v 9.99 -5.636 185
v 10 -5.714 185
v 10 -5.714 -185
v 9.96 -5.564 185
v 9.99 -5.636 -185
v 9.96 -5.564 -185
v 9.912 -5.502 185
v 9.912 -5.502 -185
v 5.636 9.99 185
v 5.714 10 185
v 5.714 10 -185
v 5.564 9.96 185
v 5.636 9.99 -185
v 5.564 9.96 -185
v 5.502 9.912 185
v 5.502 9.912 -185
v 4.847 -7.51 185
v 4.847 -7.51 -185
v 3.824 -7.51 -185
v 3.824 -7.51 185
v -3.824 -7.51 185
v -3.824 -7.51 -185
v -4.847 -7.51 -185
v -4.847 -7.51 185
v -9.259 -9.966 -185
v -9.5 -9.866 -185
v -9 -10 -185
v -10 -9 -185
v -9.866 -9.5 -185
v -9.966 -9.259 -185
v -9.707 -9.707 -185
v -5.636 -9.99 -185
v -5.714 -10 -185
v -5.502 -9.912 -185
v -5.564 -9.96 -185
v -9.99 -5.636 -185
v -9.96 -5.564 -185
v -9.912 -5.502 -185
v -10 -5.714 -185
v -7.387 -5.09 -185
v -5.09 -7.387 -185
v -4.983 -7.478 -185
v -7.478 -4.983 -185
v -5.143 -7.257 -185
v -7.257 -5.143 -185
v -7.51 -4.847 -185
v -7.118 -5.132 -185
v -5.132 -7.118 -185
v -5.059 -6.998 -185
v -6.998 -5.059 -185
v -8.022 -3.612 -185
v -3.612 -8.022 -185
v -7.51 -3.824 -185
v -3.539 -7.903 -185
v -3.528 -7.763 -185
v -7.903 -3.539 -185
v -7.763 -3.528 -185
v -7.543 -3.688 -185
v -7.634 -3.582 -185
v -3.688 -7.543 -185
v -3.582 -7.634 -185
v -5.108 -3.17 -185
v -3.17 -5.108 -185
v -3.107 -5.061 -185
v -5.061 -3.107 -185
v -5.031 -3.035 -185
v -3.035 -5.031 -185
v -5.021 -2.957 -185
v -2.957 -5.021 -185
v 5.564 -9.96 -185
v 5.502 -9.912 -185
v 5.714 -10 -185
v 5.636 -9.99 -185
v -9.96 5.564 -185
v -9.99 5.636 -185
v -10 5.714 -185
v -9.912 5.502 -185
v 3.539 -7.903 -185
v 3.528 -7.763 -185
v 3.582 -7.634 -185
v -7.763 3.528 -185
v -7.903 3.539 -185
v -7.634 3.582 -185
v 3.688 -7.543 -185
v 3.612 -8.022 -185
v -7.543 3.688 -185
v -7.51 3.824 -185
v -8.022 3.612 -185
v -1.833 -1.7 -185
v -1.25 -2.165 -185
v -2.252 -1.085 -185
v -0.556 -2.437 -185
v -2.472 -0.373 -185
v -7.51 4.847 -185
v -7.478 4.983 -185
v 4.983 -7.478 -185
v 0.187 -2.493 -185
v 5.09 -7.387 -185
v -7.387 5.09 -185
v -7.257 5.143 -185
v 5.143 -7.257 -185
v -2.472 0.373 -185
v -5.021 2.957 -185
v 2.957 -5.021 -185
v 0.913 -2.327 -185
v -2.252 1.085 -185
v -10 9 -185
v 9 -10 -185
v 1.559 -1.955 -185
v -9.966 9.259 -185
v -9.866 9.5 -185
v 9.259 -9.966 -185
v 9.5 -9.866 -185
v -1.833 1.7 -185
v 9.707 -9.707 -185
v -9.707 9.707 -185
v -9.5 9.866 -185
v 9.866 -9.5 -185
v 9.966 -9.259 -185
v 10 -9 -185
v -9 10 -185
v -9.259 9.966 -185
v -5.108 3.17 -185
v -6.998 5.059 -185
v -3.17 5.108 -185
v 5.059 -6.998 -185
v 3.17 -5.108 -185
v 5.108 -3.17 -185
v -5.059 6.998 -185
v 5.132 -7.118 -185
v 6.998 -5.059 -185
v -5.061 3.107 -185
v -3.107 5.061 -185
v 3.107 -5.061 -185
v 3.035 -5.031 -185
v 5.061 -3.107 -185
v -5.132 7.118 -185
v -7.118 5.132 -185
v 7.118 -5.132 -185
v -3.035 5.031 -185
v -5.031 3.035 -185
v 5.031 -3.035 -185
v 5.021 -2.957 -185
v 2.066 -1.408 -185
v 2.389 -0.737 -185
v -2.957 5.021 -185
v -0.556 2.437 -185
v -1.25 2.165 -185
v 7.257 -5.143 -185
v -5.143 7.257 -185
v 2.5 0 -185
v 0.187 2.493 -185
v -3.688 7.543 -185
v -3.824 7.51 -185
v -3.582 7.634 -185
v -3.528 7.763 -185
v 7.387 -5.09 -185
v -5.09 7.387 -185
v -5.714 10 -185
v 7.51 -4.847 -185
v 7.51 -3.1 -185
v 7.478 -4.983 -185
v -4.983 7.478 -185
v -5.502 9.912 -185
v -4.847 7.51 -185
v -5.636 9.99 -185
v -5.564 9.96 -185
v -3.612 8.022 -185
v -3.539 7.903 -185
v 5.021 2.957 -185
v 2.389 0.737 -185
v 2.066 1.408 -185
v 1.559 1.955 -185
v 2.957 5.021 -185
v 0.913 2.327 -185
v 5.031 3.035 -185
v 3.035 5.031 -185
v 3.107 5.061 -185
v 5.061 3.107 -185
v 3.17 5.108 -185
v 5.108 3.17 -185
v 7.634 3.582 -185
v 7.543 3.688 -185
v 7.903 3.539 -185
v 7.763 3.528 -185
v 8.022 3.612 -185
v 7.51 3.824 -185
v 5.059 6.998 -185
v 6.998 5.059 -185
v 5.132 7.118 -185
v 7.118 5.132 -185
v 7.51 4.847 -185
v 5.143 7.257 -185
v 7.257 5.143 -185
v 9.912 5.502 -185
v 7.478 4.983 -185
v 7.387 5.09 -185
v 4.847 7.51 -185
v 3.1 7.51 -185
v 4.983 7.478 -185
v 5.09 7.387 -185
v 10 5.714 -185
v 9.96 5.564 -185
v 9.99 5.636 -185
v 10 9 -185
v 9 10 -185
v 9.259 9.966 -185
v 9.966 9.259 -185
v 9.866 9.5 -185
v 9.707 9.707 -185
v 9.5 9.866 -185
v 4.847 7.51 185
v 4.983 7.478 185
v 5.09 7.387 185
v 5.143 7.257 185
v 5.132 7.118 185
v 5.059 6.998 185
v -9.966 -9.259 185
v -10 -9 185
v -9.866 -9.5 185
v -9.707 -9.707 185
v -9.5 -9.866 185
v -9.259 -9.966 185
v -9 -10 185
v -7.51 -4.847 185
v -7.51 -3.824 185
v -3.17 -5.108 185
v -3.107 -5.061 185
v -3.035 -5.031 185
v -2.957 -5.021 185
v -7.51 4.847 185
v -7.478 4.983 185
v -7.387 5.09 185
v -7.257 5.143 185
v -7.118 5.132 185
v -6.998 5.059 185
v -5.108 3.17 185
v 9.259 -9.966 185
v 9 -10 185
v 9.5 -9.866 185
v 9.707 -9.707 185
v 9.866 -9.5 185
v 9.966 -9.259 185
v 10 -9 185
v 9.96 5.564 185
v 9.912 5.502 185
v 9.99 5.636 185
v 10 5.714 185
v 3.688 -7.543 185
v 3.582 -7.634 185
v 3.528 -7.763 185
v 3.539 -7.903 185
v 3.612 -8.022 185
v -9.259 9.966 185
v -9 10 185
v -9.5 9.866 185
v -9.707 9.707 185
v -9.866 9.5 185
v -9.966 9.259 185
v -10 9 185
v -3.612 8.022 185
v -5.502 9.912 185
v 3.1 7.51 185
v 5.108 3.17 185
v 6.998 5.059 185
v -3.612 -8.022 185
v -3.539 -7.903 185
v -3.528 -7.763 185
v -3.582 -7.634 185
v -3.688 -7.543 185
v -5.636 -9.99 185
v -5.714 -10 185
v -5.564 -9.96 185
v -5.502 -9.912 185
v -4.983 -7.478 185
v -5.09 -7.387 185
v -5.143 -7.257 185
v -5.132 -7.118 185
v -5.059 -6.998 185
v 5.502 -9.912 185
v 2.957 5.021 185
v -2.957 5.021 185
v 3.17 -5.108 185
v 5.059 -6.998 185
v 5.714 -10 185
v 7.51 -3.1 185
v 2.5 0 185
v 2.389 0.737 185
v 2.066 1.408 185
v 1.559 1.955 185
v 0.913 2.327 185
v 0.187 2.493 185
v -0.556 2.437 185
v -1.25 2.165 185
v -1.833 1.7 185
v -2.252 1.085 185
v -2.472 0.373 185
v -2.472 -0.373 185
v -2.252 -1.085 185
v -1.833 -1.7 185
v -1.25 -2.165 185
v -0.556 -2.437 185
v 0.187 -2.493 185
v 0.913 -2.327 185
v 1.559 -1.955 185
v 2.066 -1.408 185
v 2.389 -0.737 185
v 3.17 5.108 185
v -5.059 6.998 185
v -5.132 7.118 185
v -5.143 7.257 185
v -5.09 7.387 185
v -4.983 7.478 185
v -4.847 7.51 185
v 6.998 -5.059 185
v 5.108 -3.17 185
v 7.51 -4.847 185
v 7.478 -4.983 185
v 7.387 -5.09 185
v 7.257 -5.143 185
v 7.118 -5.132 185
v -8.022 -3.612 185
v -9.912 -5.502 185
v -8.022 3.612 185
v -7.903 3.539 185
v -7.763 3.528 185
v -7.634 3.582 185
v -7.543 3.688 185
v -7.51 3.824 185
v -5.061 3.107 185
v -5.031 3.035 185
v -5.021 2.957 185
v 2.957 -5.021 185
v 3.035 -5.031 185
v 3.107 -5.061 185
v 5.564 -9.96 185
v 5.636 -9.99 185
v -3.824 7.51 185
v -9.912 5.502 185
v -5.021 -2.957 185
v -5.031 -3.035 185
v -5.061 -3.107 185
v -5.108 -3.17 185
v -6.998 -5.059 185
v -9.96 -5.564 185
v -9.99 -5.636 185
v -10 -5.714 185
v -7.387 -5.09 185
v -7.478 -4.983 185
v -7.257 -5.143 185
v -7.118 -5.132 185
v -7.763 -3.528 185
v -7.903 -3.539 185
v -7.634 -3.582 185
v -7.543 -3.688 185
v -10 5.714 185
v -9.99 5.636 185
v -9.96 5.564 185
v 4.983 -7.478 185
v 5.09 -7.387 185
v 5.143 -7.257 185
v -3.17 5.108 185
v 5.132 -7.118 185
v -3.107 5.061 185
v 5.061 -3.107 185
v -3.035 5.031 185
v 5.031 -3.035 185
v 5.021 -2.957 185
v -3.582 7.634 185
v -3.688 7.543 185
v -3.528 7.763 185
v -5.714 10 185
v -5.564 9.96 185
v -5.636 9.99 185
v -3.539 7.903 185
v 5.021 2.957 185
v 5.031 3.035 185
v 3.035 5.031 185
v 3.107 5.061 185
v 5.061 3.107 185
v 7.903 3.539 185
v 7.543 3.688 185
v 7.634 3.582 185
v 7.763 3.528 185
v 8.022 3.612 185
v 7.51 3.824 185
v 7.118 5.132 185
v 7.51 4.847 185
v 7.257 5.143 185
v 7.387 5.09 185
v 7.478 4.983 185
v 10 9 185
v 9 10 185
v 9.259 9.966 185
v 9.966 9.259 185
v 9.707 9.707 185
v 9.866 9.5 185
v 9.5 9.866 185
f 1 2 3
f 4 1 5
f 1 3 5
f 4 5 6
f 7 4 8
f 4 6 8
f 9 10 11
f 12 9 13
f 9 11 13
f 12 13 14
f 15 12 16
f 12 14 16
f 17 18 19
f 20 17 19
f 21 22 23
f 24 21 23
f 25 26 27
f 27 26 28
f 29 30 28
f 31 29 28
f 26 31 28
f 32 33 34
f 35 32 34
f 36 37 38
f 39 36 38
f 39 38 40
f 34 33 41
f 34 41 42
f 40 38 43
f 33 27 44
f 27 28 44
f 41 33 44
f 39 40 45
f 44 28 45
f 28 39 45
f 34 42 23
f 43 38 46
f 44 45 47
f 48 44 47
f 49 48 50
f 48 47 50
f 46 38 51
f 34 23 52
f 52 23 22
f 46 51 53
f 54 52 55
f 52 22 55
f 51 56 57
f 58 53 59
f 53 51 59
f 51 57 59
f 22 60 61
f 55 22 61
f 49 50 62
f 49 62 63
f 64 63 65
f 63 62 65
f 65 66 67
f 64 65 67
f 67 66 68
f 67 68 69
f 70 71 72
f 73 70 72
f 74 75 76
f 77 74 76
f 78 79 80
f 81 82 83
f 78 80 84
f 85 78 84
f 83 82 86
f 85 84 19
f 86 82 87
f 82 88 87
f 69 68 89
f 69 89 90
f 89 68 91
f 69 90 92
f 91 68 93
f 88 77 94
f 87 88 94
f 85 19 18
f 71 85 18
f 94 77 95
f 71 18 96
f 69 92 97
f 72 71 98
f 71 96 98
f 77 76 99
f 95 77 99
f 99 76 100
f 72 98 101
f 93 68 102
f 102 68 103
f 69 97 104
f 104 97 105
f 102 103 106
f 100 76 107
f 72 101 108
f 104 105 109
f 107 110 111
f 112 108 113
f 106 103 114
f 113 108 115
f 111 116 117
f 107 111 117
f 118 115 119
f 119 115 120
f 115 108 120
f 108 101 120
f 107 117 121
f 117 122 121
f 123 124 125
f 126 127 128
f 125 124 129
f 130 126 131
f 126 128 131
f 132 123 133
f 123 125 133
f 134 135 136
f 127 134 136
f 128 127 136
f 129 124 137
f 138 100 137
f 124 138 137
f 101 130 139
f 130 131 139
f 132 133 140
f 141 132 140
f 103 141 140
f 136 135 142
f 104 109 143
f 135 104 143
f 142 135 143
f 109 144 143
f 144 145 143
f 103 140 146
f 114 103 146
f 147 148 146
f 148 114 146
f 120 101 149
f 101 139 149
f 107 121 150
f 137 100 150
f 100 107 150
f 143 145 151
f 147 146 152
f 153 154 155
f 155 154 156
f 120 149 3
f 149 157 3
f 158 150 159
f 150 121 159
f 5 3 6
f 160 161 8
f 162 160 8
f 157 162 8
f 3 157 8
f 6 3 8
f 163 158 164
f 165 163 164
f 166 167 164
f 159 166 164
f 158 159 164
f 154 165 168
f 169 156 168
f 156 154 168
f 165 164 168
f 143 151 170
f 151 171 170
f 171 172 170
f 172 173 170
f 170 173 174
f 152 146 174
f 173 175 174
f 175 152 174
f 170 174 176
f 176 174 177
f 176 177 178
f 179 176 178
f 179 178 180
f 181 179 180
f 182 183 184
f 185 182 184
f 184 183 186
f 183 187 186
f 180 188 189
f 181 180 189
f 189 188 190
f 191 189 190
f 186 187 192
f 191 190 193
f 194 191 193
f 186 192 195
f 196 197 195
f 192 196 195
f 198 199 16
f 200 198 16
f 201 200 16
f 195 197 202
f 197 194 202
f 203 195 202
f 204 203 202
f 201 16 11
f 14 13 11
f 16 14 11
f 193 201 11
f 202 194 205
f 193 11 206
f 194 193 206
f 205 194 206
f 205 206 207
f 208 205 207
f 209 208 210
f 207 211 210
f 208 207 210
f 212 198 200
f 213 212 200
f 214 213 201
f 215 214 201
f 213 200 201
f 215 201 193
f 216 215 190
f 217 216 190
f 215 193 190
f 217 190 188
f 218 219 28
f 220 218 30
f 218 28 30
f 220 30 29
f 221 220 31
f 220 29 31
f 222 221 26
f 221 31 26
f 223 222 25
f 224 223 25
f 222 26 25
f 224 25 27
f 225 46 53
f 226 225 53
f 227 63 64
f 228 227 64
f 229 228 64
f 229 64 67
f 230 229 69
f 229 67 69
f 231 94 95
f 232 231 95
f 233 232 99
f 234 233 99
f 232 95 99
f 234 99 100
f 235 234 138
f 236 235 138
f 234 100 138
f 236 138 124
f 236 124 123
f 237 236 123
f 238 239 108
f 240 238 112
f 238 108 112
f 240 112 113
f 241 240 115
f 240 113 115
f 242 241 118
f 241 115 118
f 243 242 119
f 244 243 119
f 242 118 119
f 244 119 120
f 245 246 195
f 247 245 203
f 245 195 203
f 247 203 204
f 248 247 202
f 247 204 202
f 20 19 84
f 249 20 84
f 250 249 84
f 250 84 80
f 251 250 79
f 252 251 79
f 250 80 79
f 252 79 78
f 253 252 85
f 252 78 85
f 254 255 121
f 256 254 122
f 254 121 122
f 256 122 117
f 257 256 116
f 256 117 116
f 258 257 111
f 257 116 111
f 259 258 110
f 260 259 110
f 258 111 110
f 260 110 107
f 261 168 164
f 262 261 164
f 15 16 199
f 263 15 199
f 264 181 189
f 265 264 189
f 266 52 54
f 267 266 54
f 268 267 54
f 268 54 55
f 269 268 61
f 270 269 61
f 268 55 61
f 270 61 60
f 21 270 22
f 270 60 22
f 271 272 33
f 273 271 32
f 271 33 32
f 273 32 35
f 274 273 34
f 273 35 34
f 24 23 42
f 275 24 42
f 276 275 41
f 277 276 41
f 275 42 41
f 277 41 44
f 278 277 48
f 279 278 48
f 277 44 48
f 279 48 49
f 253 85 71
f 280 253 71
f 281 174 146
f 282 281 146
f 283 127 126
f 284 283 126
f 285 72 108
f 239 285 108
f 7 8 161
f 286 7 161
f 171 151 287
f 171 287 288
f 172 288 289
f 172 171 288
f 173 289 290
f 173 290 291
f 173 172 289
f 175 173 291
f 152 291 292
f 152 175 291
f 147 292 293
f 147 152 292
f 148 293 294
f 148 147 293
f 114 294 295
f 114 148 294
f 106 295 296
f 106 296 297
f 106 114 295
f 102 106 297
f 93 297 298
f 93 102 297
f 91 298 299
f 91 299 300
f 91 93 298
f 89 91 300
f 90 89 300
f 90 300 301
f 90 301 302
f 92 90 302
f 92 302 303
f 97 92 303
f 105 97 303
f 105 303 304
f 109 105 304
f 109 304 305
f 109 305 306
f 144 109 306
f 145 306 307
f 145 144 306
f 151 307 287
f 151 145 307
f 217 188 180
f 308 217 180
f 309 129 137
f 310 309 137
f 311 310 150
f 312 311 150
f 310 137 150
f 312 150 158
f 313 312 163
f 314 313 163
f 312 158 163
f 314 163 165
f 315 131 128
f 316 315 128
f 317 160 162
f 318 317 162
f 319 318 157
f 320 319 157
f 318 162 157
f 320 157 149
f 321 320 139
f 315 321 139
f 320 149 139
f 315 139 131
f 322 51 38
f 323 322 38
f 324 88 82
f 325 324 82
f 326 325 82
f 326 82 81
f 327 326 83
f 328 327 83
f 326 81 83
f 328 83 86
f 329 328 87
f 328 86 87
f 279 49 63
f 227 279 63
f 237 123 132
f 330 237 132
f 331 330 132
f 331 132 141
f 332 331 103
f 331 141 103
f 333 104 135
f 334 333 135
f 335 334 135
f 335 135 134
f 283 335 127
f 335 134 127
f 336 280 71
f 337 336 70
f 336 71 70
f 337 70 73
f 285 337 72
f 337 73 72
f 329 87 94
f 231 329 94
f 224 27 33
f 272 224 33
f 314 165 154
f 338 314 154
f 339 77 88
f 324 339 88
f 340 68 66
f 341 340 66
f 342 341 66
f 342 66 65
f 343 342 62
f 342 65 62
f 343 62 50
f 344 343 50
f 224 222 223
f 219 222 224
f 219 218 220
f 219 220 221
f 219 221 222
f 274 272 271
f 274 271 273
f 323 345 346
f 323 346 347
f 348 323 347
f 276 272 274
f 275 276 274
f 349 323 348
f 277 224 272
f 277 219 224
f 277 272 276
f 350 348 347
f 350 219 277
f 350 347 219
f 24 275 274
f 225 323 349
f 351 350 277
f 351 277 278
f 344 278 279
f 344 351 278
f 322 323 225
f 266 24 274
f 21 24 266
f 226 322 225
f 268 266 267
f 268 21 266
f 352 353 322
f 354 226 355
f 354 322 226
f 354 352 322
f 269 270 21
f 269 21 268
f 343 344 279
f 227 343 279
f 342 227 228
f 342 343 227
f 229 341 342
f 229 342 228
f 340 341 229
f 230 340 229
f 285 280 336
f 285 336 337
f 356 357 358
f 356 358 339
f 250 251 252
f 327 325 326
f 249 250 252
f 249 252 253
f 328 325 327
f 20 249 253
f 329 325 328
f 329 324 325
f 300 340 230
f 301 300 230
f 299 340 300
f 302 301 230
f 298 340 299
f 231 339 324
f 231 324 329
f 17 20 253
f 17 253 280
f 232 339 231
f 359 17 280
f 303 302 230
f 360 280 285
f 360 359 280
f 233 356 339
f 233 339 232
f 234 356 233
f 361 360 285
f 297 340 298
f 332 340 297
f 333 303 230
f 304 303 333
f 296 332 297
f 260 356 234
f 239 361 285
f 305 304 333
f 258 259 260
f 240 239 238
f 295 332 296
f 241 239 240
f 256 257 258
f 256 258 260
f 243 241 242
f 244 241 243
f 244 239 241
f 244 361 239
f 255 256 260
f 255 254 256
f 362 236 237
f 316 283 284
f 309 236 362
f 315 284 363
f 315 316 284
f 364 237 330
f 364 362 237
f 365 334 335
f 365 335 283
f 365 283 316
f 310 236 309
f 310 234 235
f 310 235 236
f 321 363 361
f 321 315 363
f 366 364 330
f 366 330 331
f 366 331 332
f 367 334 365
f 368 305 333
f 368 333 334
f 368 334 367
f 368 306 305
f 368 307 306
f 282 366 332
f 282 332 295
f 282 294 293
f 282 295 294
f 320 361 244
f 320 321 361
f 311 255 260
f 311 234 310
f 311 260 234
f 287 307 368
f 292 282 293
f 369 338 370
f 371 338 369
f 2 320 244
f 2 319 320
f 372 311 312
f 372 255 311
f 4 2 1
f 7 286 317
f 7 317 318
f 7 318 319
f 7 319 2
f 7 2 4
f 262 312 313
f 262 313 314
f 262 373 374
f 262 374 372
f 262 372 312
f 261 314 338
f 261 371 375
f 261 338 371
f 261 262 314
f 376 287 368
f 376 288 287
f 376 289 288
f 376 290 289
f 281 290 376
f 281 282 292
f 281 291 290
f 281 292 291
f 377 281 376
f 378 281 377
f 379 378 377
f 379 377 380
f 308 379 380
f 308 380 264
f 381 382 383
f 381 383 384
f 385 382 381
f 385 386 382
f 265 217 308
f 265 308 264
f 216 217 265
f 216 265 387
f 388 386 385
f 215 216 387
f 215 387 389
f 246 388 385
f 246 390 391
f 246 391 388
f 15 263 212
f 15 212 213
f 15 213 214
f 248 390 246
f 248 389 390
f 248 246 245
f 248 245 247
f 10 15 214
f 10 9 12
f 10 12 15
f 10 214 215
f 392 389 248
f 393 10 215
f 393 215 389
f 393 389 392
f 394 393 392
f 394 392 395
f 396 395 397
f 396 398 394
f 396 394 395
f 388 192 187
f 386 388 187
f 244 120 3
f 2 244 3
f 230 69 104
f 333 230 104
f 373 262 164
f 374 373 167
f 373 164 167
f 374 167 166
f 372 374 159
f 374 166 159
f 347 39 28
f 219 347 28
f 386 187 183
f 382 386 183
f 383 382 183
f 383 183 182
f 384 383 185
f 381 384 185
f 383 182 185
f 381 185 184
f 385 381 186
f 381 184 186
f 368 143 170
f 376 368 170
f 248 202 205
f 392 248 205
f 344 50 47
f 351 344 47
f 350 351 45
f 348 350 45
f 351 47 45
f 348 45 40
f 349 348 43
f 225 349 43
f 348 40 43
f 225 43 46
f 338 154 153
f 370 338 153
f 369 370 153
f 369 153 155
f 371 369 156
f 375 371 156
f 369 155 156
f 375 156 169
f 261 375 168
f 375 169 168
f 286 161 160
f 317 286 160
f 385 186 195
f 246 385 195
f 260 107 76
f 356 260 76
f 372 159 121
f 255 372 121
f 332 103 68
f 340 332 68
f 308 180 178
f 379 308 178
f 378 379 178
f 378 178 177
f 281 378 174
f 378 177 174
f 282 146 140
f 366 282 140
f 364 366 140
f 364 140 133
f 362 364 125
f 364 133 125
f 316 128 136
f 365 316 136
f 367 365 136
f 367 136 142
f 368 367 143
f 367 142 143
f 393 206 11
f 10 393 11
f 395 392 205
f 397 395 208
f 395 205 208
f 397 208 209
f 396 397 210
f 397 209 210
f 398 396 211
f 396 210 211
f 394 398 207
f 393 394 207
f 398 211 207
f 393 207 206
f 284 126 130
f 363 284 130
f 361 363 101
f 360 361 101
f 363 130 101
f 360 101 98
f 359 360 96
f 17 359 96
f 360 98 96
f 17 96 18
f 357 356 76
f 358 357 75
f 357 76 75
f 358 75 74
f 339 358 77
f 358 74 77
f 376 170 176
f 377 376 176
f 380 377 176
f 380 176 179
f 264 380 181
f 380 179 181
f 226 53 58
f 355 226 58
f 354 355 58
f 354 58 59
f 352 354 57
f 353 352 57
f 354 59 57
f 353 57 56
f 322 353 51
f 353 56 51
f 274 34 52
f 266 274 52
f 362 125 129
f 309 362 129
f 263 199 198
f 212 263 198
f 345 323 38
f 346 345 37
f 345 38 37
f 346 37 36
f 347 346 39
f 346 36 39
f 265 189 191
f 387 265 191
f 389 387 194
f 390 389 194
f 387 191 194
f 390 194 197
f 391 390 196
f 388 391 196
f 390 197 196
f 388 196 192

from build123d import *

# Parameters (mm, degrees)
CROQUIS11_R                = 2.5
MIEMBRO_ESTRUCTURAL1_DEPTH = 370


with BuildPart() as part:
    # Croquis11 → Miembro estructural1 (new body)
    with BuildSketch(Plane.XY.offset(-185)):
        with BuildLine():
            Line((-9, -10), (-5.713990218, -10))
            ThreePointArc((-5.713990218, -10), (-5.599185189, -9.97716386), (-5.501858184, -9.912132034))
            Line((-5.501858184, -9.912132034), (-3.612132034, -8.022405885))
            ThreePointArc((-3.612132034, -8.022405885), (-3.547100209, -7.695468821), (-3.824264069, -7.51027385))
            Line((-3.824264069, -7.51027385), (-4.847118775, -7.51027385))
            ThreePointArc((-4.847118775, -7.51027385), (-5.124282635, -7.32507888), (-5.059250809, -6.998141816))
            Line((-5.059250809, -6.998141816), (-3.16952466, -5.108415666))
            ThreePointArc((-3.16952466, -5.108415666), (-3.072197655, -5.043383841), (-2.957392625, -5.0205477))
            Line((-2.957392625, -5.0205477), (2.957392625, -5.0205477))
            ThreePointArc((2.957392625, -5.0205477), (3.072197655, -5.043383841), (3.16952466, -5.108415666))
            Line((3.16952466, -5.108415666), (5.059250809, -6.998141816))
            ThreePointArc((5.059250809, -6.998141816), (5.124282635, -7.32507888), (4.847118775, -7.51027385))
            Line((4.847118775, -7.51027385), (3.824264069, -7.51027385))
            ThreePointArc((3.824264069, -7.51027385), (3.547100209, -7.695468821), (3.612132034, -8.022405885))
            Line((3.612132034, -8.022405885), (5.501858184, -9.912132034))
            ThreePointArc((5.501858184, -9.912132034), (5.599185189, -9.97716386), (5.713990218, -10))
            Line((5.713990218, -10), (9, -10))
            ThreePointArc((9, -10), (9.707106781, -9.707106781), (10, -9))
            Line((10, -9), (10, -5.713990218))
            ThreePointArc((10, -5.713990218), (9.97716386, -5.599185189), (9.912132034, -5.501858184))
            Line((9.912132034, -5.501858184), (7.51027385, -3.1))
            Line((7.51027385, -3.1), (7.51027385, -4.847118775))
            ThreePointArc((7.51027385, -4.847118775), (7.32507888, -5.124282635), (6.998141816, -5.059250809))
            Line((6.998141816, -5.059250809), (5.108415666, -3.16952466))
            ThreePointArc((5.108415666, -3.16952466), (5.043383841, -3.072197655), (5.0205477, -2.957392625))
            Line((5.0205477, -2.957392625), (5.0205477, 2.957392625))
            ThreePointArc((5.0205477, 2.957392625), (5.043383841, 3.072197655), (5.108415666, 3.16952466))
            Line((5.108415666, 3.16952466), (6.998141816, 5.059250809))
            ThreePointArc((6.998141816, 5.059250809), (7.32507888, 5.124282635), (7.51027385, 4.847118775))
            Line((7.51027385, 4.847118775), (7.51027385, 3.824264069))
            ThreePointArc((7.51027385, 3.824264069), (7.695468821, 3.547100209), (8.022405885, 3.612132034))
            Line((8.022405885, 3.612132034), (9.912132034, 5.501858184))
            ThreePointArc((9.912132034, 5.501858184), (9.97716386, 5.599185189), (10, 5.713990218))
            Line((10, 5.713990218), (10, 9))
            ThreePointArc((10, 9), (9.707106781, 9.707106781), (9, 10))
            Line((9, 10), (5.713990218, 10))
            ThreePointArc((5.713990218, 10), (5.599185189, 9.97716386), (5.501858184, 9.912132034))
            Line((5.501858184, 9.912132034), (3.1, 7.51027385))
            Line((3.1, 7.51027385), (4.847118775, 7.51027385))
            ThreePointArc((4.847118775, 7.51027385), (5.124282635, 7.32507888), (5.059250809, 6.998141816))
            Line((5.059250809, 6.998141816), (3.16952466, 5.108415666))
            ThreePointArc((3.16952466, 5.108415666), (3.072197655, 5.043383841), (2.957392625, 5.0205477))
            Line((2.957392625, 5.0205477), (-2.957392625, 5.0205477))
            ThreePointArc((-2.957392625, 5.0205477), (-3.072197655, 5.043383841), (-3.16952466, 5.108415666))
            Line((-3.16952466, 5.108415666), (-5.059250809, 6.998141816))
            ThreePointArc((-5.059250809, 6.998141816), (-5.124282635, 7.32507888), (-4.847118775, 7.51027385))
            Line((-4.847118775, 7.51027385), (-3.824264069, 7.51027385))
            ThreePointArc((-3.824264069, 7.51027385), (-3.547100209, 7.695468821), (-3.612132034, 8.022405885))
            Line((-3.612132034, 8.022405885), (-5.501858184, 9.912132034))
            ThreePointArc((-5.501858184, 9.912132034), (-5.599185189, 9.97716386), (-5.713990218, 10))
            Line((-5.713990218, 10), (-9, 10))
            ThreePointArc((-9, 10), (-9.707106781, 9.707106781), (-10, 9))
            Line((-10, 9), (-10, 5.713990218))
            ThreePointArc((-10, 5.713990218), (-9.97716386, 5.599185189), (-9.912132034, 5.501858184))
            Line((-9.912132034, 5.501858184), (-8.022405885, 3.612132034))
            ThreePointArc((-8.022405885, 3.612132034), (-7.695468821, 3.547100209), (-7.51027385, 3.824264069))
            Line((-7.51027385, 3.824264069), (-7.51027385, 4.847118775))
            ThreePointArc((-7.51027385, 4.847118775), (-7.32507888, 5.124282635), (-6.998141816, 5.059250809))
            Line((-6.998141816, 5.059250809), (-5.108415666, 3.16952466))
            ThreePointArc((-5.108415666, 3.16952466), (-5.043383841, 3.072197655), (-5.0205477, 2.957392625))
            Line((-5.0205477, 2.957392625), (-5.0205477, -2.957392625))
            ThreePointArc((-5.0205477, -2.957392625), (-5.043383841, -3.072197655), (-5.108415666, -3.16952466))
            Line((-5.108415666, -3.16952466), (-6.998141816, -5.059250809))
            ThreePointArc((-6.998141816, -5.059250809), (-7.32507888, -5.124282635), (-7.51027385, -4.847118775))
            Line((-7.51027385, -4.847118775), (-7.51027385, -3.824264069))
            ThreePointArc((-7.51027385, -3.824264069), (-7.695468821, -3.547100209), (-8.022405885, -3.612132034))
            Line((-8.022405885, -3.612132034), (-9.912132034, -5.501858184))
            ThreePointArc((-9.912132034, -5.501858184), (-9.97716386, -5.599185189), (-10, -5.713990218))
            Line((-10, -5.713990218), (-10, -9))
            ThreePointArc((-10, -9), (-9.707106781, -9.707106781), (-9, -10))
        make_face()
        Circle(CROQUIS11_R, mode=Mode.SUBTRACT)
    extrude(amount=MIEMBRO_ESTRUCTURAL1_DEPTH)


solid = part.part
